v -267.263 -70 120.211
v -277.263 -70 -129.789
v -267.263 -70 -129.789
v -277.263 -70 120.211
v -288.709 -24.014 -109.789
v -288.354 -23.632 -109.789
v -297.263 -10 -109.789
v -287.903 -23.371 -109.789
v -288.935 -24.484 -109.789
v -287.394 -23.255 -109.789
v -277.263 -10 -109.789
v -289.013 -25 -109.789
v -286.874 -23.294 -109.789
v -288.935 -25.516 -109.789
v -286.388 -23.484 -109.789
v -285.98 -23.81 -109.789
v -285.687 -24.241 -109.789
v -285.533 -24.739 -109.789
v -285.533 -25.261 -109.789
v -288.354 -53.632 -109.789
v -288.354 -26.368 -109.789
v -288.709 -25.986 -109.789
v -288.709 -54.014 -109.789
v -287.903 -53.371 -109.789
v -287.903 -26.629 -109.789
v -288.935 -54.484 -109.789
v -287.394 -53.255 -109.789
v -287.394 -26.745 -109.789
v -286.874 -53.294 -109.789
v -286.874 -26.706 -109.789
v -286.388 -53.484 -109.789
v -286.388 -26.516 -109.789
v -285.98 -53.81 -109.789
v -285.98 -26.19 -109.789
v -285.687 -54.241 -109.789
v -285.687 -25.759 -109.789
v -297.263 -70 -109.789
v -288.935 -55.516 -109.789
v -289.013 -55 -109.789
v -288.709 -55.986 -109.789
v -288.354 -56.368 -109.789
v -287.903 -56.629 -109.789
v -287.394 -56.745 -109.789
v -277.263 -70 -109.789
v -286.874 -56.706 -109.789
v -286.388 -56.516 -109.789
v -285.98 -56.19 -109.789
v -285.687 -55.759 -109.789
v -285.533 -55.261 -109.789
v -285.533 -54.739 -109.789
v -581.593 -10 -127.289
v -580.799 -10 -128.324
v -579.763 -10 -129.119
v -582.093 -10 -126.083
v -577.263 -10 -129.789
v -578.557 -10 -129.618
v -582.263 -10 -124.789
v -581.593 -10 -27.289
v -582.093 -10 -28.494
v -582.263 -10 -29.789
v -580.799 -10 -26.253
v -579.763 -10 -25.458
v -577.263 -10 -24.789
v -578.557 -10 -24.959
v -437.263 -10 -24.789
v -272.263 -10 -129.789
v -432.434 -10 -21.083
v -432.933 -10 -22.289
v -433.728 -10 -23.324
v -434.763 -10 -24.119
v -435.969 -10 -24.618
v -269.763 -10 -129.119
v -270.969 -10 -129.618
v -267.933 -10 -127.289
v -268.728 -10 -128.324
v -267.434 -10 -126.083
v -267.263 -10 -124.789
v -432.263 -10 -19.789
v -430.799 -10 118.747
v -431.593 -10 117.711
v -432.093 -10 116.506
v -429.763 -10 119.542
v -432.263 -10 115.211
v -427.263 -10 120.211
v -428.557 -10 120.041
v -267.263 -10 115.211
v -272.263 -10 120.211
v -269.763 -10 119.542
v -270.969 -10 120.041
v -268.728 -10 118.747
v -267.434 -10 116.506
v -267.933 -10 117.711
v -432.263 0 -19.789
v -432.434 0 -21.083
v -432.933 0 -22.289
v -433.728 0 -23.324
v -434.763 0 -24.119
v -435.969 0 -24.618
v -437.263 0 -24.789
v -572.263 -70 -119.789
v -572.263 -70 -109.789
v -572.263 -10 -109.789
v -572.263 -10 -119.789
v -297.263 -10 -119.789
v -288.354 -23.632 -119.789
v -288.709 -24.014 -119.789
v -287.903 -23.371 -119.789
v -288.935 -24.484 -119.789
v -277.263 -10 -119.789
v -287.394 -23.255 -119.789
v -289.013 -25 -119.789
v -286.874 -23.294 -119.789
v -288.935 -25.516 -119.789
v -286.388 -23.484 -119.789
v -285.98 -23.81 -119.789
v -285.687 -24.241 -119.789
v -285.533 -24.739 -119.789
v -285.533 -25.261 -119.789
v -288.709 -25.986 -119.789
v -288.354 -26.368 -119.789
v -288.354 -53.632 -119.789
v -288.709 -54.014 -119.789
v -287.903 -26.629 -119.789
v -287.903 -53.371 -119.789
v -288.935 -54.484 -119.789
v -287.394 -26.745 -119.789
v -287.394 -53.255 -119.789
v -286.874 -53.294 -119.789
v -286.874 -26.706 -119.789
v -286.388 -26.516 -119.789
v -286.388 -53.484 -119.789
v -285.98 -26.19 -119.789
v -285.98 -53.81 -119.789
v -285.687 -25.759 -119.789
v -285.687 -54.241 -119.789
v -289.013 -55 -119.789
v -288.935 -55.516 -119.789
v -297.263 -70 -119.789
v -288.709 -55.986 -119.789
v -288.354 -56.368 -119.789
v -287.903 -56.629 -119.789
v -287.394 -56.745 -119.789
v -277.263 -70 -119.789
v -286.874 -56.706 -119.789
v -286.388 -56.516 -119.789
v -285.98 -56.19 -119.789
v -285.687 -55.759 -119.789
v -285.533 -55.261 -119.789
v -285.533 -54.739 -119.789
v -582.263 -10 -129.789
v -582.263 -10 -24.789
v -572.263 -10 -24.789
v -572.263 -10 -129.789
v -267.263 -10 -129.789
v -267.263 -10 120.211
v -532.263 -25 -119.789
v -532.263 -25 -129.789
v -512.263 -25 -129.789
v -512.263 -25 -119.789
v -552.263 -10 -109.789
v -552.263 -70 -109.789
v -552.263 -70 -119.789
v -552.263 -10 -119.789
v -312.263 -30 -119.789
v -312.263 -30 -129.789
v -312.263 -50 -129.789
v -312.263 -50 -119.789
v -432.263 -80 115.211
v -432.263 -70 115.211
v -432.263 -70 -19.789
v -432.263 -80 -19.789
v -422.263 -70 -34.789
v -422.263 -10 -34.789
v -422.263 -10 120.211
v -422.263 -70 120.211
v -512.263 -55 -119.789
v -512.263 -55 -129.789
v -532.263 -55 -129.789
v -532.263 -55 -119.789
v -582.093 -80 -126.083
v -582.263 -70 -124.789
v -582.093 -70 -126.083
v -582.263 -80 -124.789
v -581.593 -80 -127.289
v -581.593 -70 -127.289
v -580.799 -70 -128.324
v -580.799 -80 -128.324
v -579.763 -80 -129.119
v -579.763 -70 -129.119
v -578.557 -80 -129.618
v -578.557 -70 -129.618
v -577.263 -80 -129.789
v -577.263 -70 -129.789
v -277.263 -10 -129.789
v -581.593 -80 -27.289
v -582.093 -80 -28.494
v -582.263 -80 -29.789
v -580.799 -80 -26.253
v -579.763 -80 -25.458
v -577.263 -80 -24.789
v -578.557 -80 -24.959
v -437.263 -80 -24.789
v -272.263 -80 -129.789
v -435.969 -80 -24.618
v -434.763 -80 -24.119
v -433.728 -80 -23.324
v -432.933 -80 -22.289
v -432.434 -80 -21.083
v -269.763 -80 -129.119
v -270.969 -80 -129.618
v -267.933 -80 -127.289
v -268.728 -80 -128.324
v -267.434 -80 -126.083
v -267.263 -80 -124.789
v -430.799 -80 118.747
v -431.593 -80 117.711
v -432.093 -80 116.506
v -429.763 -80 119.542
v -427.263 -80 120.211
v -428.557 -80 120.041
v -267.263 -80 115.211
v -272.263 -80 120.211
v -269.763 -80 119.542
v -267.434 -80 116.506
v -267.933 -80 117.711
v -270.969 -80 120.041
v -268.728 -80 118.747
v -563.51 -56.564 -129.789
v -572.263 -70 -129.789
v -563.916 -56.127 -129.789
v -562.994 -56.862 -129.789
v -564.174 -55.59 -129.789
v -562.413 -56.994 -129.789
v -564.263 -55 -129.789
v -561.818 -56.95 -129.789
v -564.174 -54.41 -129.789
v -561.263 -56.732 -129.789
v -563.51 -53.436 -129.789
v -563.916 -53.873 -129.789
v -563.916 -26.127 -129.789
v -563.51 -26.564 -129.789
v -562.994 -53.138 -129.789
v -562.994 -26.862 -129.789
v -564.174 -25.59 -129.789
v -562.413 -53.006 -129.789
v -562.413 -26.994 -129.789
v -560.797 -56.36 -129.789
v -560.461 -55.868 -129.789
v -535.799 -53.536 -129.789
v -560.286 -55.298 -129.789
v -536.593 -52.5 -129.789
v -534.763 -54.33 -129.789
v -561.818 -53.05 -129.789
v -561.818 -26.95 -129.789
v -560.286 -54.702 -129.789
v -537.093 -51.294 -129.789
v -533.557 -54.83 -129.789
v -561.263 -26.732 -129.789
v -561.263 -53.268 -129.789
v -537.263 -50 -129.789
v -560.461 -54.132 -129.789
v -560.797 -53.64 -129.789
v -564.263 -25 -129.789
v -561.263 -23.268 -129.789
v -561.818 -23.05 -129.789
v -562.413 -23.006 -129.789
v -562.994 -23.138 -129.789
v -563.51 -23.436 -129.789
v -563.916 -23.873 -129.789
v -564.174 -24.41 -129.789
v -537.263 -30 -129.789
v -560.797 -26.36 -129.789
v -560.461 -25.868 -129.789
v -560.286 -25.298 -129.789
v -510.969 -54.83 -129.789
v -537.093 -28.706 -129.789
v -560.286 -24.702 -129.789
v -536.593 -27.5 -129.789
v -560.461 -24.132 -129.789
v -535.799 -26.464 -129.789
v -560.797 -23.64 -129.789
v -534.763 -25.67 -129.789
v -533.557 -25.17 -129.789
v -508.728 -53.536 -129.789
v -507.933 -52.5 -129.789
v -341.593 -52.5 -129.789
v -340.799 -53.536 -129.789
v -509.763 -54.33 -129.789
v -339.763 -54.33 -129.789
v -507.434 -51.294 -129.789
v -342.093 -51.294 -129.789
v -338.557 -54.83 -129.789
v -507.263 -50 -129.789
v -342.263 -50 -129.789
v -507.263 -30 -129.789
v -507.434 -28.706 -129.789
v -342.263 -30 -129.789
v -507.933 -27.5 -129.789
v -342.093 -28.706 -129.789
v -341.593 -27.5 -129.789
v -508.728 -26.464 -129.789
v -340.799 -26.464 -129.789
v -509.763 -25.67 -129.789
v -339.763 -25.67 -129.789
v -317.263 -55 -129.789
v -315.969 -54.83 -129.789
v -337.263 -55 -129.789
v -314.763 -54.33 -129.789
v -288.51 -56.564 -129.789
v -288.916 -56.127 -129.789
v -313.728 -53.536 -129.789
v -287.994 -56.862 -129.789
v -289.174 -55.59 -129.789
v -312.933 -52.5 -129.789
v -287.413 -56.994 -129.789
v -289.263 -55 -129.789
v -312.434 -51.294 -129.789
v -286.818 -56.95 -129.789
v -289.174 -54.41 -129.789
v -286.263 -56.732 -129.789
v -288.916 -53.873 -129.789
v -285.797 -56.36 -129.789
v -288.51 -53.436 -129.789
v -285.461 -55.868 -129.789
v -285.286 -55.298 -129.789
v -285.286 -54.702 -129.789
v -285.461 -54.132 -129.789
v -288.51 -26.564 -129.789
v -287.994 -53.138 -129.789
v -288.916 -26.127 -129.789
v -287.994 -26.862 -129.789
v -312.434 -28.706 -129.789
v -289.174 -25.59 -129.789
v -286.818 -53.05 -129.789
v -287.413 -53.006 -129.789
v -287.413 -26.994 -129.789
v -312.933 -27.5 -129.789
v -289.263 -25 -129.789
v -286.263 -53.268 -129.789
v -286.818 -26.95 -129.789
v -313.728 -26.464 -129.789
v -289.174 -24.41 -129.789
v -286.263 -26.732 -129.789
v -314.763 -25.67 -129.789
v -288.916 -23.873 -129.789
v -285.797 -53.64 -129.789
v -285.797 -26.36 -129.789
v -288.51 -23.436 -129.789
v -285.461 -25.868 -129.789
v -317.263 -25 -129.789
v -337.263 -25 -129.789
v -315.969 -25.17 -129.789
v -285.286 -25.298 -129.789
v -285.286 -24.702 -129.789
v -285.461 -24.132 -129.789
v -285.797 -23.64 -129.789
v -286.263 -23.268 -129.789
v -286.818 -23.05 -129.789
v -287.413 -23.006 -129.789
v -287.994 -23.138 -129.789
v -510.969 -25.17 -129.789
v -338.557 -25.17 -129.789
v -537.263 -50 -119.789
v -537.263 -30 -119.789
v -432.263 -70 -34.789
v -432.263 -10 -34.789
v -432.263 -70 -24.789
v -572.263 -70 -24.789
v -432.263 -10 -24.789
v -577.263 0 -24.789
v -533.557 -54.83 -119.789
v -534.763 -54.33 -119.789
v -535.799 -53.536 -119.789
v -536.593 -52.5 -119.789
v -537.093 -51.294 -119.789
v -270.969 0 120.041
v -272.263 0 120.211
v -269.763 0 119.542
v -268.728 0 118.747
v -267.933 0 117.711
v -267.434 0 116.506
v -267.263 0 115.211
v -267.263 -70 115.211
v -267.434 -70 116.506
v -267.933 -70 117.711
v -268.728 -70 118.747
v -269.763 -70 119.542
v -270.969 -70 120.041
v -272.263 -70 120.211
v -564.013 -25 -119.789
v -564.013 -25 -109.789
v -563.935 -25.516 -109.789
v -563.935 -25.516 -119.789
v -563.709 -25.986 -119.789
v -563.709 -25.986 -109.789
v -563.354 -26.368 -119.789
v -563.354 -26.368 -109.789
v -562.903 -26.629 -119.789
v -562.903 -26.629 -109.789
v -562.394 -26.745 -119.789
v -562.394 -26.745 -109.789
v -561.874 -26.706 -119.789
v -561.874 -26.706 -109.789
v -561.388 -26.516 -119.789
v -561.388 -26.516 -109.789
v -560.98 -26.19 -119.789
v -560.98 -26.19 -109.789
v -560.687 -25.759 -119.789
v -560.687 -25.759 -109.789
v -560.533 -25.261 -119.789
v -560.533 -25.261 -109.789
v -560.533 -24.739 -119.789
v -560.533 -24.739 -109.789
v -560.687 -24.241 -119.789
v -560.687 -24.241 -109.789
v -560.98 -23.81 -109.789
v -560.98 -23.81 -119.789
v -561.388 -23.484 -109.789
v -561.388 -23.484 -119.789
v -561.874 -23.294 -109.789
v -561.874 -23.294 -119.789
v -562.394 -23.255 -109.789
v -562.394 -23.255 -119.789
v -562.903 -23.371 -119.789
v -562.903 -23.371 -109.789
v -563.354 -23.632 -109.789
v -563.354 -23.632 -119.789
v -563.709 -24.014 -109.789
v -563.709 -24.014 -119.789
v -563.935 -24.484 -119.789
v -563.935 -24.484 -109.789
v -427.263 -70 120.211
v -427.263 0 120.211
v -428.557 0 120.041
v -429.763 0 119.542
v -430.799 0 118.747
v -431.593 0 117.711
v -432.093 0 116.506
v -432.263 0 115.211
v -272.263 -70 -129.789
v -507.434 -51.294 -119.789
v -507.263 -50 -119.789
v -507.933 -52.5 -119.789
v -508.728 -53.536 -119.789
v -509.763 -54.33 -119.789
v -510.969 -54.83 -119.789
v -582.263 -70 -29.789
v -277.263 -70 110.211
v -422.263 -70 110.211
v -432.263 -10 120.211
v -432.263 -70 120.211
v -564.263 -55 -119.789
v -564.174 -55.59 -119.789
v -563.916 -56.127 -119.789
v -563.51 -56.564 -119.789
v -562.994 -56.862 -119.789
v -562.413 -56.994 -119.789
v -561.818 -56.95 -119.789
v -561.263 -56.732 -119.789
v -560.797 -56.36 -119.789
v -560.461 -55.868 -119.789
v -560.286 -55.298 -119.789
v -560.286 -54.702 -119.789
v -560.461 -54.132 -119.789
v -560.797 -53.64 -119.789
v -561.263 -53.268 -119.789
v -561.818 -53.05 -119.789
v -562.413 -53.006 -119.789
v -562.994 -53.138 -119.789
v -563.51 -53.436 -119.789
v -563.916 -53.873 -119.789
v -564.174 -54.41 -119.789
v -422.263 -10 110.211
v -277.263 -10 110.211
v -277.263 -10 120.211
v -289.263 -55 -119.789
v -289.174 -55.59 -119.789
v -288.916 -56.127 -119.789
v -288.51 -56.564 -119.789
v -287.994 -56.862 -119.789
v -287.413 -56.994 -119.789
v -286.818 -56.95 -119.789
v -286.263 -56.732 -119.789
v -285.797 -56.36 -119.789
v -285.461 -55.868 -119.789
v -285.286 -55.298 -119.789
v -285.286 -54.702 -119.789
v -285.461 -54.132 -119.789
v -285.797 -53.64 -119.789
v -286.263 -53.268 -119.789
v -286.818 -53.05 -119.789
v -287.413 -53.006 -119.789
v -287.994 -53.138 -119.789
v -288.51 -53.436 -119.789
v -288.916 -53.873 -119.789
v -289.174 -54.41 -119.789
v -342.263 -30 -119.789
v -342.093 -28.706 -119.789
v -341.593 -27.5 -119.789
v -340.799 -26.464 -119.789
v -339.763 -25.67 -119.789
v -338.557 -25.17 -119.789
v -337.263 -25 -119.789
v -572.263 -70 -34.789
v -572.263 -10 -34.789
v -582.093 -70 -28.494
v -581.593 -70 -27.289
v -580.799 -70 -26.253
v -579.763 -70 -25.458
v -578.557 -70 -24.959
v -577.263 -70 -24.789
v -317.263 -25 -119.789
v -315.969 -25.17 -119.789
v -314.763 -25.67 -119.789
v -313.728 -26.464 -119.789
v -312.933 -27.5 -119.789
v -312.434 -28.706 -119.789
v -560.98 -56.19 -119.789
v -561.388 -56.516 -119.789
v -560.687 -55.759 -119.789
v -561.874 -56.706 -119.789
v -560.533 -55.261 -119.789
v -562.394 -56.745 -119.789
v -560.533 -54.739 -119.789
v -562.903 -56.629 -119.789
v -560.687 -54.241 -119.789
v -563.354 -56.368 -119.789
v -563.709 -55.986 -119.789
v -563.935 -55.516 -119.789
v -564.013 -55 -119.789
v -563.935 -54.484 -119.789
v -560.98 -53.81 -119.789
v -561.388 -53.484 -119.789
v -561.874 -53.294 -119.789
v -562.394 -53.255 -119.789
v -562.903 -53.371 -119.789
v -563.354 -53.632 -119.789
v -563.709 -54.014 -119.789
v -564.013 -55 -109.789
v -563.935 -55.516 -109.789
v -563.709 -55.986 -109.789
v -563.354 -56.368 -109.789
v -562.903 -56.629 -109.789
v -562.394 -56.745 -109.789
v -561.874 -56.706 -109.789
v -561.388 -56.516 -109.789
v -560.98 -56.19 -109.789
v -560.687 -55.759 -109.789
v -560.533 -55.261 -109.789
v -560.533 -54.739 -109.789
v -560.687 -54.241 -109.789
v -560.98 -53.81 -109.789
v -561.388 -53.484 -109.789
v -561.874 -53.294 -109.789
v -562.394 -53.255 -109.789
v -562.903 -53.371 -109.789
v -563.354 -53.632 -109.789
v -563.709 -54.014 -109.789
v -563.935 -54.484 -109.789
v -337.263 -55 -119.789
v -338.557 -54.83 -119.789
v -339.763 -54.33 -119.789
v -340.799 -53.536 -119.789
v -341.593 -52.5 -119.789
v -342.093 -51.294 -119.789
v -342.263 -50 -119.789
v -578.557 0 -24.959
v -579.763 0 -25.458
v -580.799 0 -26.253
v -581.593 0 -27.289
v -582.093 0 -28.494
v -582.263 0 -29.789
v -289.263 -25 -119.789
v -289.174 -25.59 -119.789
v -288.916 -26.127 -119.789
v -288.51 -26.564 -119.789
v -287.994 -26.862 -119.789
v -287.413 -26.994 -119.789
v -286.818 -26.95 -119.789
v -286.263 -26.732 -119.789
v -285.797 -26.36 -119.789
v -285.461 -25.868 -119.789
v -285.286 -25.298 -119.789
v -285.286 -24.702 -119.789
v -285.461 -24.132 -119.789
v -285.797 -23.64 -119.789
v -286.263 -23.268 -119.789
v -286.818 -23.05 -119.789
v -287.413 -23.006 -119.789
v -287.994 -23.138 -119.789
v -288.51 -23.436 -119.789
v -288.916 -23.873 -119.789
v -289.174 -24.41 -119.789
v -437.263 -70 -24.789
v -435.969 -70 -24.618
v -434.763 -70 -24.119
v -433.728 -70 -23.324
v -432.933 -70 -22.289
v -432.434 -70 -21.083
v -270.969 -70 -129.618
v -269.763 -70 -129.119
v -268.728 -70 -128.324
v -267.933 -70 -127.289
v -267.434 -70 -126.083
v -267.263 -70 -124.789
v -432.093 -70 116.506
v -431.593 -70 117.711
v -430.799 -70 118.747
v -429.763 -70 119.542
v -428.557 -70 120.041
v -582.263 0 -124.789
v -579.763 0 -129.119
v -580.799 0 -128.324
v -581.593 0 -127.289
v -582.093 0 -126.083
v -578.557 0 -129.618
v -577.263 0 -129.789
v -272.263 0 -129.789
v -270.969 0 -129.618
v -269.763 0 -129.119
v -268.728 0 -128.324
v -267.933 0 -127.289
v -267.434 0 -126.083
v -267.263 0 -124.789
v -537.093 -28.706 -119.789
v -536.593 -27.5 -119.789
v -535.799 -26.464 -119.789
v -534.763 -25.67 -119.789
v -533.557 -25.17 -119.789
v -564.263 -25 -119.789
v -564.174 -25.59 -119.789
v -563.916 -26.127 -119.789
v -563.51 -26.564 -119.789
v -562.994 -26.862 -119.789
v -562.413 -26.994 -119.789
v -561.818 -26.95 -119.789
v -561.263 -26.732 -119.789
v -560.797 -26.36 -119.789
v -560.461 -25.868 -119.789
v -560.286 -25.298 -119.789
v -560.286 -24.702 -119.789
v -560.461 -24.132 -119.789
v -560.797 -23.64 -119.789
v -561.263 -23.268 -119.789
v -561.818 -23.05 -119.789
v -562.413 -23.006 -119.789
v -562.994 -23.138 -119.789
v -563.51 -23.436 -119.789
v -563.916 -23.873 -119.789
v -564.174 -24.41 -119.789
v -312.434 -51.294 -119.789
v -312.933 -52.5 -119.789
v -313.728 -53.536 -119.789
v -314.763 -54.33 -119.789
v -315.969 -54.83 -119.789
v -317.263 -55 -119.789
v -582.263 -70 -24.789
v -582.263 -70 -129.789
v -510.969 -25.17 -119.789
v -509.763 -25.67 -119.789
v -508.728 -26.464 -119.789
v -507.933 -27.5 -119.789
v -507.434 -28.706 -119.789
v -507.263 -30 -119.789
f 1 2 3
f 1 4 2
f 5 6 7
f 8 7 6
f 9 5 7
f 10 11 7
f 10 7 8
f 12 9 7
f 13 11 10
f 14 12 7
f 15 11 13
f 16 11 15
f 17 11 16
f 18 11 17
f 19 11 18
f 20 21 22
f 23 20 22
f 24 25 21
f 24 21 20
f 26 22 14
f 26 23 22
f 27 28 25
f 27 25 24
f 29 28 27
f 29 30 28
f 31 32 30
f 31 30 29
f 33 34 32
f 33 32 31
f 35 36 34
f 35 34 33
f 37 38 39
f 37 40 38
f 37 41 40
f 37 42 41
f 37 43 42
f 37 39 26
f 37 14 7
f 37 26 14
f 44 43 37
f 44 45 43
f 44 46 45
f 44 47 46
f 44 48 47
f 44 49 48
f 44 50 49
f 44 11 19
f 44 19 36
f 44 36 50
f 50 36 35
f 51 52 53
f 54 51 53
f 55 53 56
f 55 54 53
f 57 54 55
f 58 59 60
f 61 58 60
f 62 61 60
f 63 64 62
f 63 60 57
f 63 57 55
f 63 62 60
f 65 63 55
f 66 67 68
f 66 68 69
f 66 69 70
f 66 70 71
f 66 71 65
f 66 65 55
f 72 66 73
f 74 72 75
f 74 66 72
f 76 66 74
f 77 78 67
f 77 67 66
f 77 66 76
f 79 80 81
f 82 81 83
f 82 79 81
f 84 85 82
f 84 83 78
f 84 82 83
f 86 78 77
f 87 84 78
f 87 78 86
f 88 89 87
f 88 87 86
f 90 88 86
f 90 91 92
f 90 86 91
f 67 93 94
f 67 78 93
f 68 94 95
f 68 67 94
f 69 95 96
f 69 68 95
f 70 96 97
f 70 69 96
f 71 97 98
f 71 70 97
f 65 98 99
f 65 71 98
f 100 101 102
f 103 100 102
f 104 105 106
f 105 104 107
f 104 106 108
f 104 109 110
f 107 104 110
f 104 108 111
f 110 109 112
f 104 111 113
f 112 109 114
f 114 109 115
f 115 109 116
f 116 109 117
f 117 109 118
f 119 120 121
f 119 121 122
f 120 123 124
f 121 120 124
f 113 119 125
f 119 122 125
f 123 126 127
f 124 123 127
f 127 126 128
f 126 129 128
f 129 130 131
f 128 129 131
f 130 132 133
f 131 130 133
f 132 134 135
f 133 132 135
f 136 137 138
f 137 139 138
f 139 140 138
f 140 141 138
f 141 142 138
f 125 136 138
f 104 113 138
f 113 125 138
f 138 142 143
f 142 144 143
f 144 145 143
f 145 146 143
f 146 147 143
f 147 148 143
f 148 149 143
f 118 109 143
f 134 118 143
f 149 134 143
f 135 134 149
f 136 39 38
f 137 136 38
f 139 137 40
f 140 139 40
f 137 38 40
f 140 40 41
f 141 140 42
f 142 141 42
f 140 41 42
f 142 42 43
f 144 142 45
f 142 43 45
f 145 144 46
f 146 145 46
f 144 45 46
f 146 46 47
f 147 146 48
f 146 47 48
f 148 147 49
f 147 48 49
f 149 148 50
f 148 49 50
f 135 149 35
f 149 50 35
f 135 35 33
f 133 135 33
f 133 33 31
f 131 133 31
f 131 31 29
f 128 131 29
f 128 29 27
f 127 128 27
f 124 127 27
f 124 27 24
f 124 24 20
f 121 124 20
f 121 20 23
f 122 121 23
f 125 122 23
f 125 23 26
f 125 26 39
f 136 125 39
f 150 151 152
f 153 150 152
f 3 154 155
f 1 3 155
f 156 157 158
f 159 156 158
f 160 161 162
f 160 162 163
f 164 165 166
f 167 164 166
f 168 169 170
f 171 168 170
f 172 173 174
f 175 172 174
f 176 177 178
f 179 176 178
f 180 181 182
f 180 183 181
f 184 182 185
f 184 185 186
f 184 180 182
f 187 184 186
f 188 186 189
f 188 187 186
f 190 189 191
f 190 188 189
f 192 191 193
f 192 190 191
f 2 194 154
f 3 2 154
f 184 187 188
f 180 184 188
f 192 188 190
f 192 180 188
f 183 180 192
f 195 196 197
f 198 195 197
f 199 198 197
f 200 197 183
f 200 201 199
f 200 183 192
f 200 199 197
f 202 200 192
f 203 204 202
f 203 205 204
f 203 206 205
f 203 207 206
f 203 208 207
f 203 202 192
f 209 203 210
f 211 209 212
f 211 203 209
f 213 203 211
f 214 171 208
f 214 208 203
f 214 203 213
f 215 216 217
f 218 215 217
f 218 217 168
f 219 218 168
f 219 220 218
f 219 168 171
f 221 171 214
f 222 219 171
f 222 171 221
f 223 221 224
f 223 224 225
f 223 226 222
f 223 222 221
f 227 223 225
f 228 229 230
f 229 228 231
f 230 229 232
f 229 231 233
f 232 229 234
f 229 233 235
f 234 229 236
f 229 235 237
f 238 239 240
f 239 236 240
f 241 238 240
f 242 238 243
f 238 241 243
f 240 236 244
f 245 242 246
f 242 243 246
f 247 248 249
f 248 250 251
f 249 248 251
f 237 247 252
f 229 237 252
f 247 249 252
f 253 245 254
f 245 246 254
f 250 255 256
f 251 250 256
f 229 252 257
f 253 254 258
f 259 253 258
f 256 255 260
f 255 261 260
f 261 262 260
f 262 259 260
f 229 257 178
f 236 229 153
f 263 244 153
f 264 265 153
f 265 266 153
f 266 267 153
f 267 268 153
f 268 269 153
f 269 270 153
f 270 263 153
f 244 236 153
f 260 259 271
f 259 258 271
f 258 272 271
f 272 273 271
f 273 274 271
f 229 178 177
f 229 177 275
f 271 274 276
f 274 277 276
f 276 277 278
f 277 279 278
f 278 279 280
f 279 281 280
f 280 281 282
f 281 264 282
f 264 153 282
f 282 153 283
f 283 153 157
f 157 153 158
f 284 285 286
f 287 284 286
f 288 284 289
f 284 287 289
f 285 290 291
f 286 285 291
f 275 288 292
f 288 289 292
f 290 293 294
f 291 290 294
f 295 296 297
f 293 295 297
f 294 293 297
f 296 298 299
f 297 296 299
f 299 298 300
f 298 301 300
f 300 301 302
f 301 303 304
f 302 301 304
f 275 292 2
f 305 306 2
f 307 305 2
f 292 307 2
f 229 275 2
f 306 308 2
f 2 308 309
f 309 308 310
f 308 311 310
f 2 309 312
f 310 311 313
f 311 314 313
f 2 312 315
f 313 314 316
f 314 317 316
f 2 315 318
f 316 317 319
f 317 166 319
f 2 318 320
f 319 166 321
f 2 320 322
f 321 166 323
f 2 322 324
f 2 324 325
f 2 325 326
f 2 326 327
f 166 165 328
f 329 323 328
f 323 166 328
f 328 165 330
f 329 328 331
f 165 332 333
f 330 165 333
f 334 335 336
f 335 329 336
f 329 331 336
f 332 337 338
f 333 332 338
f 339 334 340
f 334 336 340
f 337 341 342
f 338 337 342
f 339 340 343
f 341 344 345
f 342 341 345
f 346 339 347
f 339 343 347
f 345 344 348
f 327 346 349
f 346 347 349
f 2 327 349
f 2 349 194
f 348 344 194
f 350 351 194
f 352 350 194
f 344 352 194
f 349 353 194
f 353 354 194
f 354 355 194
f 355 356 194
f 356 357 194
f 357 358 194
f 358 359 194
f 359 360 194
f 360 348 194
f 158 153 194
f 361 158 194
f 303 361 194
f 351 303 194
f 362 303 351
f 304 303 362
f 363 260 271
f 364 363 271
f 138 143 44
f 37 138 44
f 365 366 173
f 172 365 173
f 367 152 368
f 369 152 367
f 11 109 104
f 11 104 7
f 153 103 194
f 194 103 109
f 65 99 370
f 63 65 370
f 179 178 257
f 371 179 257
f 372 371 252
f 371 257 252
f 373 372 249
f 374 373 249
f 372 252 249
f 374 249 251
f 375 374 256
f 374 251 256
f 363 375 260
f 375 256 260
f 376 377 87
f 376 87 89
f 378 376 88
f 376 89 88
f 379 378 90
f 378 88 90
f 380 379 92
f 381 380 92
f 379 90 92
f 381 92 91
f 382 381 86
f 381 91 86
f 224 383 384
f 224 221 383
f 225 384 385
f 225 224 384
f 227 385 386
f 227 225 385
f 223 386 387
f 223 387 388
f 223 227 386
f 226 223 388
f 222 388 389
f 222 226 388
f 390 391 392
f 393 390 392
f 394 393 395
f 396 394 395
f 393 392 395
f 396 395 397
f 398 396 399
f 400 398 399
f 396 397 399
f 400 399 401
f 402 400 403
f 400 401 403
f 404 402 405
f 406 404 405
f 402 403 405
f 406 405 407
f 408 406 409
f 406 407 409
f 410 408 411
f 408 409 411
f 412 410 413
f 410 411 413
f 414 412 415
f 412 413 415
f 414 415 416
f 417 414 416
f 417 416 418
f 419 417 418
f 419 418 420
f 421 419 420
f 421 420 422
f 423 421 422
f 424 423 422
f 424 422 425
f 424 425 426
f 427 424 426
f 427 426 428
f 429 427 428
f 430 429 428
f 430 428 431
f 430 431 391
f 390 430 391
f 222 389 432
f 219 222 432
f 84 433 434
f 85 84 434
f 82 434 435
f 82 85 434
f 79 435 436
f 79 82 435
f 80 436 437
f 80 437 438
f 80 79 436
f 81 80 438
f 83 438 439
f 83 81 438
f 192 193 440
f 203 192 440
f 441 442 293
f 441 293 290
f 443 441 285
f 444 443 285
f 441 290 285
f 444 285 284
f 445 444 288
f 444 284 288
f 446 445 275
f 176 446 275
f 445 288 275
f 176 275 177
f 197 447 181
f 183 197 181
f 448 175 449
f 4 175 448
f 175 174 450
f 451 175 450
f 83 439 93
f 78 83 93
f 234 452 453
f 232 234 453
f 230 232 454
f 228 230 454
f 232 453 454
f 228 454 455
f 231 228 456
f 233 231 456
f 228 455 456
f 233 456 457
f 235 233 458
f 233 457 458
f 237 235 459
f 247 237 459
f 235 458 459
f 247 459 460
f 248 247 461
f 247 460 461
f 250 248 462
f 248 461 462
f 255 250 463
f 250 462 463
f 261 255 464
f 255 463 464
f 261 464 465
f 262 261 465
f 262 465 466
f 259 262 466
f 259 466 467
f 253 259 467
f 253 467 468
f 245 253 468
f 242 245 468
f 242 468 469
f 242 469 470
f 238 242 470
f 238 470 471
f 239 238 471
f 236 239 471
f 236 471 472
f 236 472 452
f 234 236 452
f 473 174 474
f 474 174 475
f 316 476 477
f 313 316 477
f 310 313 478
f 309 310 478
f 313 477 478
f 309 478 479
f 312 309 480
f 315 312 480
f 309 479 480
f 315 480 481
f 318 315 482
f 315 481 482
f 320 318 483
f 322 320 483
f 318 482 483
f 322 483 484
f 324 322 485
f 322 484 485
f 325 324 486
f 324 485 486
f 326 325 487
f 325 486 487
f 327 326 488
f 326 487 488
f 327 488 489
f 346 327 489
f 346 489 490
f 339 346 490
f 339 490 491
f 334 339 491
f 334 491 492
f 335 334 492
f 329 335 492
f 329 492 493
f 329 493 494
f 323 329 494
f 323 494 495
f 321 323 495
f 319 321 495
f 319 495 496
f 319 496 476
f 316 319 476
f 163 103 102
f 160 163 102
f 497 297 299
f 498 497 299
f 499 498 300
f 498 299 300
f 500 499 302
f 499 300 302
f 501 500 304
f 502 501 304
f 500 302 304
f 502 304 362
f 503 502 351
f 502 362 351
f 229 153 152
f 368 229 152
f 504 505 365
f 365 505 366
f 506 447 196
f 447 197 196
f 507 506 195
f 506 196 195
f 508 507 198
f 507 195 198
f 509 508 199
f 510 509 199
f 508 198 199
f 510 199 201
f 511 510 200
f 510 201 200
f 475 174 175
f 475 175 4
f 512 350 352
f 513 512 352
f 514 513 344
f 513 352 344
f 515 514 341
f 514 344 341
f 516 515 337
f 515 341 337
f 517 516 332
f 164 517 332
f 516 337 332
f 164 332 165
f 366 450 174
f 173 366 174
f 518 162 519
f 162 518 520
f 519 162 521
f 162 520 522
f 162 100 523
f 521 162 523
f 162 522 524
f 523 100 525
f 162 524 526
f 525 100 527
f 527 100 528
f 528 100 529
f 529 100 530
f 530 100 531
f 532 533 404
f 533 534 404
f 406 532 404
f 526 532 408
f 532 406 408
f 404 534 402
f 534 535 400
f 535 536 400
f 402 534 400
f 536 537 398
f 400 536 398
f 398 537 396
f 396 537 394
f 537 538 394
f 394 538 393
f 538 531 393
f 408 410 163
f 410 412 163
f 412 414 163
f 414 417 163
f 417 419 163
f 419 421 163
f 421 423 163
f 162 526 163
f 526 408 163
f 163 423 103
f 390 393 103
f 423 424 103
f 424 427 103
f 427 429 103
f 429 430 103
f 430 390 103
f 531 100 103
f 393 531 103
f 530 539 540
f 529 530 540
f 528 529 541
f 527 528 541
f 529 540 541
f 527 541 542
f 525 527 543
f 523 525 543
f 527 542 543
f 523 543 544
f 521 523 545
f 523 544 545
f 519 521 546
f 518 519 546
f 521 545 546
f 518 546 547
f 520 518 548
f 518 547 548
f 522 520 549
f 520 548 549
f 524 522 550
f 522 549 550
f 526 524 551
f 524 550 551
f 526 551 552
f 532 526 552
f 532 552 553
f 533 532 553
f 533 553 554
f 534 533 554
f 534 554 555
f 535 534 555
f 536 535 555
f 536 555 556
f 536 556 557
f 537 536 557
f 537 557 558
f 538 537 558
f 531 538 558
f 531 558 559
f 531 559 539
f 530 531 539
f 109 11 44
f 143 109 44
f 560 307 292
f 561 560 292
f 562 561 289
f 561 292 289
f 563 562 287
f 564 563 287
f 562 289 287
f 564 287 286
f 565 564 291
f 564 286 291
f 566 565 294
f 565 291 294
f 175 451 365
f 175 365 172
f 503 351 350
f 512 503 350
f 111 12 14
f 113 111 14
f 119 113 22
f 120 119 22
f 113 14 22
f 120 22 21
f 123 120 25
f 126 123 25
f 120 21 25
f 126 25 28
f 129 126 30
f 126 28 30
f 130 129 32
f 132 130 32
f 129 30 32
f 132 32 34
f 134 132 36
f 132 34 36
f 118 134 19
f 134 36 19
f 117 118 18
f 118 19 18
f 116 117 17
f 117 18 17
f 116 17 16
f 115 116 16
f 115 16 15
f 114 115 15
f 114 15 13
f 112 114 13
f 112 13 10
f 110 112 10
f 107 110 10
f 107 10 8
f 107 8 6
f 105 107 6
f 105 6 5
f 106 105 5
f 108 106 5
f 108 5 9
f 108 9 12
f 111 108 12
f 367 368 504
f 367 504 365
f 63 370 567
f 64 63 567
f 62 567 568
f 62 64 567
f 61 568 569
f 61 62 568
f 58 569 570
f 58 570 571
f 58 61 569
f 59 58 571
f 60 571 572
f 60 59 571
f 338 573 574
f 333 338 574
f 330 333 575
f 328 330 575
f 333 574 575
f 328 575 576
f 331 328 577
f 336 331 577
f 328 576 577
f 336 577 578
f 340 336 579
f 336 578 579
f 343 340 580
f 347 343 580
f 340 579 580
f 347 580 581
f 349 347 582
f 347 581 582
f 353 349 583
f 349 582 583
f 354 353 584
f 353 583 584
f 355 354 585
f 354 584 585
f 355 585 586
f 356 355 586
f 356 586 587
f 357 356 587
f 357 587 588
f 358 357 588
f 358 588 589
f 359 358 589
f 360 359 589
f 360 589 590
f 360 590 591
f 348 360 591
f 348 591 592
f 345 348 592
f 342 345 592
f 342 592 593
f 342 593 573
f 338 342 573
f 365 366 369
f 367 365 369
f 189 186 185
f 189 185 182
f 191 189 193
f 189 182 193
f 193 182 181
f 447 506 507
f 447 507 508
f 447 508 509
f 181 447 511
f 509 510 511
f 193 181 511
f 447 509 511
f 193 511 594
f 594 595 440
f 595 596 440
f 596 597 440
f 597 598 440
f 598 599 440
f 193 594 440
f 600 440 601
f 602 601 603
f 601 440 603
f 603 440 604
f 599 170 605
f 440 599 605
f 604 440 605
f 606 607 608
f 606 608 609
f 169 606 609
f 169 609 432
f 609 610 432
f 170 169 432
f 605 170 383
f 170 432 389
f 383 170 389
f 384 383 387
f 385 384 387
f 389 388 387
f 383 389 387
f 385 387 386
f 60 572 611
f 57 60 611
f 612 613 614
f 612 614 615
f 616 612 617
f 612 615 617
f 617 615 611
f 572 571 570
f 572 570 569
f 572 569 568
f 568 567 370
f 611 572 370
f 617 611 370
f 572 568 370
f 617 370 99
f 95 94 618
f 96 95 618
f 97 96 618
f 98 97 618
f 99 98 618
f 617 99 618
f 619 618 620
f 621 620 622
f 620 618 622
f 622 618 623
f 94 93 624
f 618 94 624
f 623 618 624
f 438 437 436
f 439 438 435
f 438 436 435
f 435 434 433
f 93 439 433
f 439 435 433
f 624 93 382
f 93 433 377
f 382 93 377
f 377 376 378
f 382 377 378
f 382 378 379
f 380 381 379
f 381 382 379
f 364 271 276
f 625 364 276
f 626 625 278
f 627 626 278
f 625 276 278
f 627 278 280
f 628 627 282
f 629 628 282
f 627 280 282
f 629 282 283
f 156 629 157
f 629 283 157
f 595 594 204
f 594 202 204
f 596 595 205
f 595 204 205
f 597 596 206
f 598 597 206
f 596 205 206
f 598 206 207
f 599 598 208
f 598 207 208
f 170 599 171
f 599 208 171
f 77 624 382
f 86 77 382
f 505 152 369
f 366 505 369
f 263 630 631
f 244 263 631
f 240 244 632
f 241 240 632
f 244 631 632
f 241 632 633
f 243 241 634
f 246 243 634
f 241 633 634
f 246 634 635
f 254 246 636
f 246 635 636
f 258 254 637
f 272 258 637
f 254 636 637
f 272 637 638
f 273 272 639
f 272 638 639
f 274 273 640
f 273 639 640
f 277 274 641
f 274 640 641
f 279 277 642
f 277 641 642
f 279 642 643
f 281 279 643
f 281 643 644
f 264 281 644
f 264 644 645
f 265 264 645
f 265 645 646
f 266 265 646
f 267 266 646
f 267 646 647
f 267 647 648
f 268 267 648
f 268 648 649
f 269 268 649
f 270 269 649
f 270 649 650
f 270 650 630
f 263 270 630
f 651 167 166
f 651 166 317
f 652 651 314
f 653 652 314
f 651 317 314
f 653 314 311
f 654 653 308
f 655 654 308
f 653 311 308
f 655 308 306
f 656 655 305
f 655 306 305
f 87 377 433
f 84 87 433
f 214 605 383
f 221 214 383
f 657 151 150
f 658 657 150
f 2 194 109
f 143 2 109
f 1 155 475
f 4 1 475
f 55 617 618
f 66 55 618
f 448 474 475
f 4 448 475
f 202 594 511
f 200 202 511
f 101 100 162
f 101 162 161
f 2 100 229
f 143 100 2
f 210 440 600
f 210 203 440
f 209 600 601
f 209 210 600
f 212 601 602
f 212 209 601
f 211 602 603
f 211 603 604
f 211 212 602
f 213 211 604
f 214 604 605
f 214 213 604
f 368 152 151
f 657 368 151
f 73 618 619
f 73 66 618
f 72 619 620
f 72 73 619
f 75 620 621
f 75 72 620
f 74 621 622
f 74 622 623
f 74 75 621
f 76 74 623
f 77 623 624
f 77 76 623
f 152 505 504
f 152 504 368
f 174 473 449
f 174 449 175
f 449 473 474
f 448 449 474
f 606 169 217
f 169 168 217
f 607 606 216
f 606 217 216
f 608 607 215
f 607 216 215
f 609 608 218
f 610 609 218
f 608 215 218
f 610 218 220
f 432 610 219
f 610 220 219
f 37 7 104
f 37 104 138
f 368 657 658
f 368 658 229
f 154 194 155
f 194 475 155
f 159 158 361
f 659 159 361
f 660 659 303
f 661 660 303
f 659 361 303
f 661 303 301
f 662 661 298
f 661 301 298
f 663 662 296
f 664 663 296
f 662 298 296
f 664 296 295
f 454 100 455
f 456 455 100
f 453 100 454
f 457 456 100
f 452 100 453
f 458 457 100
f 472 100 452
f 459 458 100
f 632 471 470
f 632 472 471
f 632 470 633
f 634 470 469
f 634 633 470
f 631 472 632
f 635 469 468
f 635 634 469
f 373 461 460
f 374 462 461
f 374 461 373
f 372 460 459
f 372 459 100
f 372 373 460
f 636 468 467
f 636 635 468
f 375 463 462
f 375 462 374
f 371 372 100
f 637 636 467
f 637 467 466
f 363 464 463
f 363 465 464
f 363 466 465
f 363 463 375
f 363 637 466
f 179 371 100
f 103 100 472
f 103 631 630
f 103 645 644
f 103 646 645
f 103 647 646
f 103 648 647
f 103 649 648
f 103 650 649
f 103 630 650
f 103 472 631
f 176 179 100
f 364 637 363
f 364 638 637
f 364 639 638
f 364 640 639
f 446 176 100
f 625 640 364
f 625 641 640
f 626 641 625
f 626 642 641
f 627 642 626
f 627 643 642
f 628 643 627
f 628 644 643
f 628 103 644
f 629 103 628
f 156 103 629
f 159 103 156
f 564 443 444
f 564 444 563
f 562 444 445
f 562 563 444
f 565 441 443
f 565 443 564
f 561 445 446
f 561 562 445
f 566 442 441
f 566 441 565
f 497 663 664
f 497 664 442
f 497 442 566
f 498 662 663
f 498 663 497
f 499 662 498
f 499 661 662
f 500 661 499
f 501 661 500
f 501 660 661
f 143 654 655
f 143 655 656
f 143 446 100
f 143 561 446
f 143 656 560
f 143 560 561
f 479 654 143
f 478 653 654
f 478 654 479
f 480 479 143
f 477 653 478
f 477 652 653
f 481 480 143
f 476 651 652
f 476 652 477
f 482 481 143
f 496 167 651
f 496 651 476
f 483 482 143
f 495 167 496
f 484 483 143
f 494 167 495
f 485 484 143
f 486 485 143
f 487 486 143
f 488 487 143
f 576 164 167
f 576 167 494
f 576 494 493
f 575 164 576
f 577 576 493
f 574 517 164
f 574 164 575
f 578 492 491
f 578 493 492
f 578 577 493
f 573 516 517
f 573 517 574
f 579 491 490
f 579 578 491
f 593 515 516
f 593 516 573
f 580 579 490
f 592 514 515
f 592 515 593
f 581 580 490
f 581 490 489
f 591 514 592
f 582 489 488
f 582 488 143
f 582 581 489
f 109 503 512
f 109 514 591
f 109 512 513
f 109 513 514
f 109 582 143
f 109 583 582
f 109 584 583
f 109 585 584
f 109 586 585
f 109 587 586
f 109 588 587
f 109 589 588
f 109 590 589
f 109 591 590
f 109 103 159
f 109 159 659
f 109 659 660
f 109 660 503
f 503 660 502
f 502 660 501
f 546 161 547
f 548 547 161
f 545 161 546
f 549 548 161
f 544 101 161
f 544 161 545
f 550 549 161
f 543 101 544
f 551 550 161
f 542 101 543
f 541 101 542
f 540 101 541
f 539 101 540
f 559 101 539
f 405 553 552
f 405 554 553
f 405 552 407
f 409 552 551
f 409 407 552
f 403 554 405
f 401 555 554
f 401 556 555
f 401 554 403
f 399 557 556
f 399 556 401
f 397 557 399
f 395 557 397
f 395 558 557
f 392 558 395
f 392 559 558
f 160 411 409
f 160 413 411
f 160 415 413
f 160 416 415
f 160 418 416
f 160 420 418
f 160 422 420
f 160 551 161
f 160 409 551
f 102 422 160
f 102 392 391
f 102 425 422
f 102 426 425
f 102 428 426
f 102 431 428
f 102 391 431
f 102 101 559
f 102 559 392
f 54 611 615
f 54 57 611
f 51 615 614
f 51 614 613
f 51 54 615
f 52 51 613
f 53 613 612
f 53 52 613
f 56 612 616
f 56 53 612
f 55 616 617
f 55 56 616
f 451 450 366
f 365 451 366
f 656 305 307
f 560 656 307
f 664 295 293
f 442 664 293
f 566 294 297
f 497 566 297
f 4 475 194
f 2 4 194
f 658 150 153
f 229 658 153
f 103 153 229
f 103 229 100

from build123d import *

# Parameters (mm, degrees)
F1_DEPTH     = 10
F3_DEPTH     = 60
F2_W         = 140
F2_H         = 10
F4_DEPTH     = 60
F5_DEPTH     = 60
F2_W_2       = 145
F6_DEPTH     = 60
F7_DEPTH     = 60
F2_W_3       = 295
F8_DEPTH     = 60
F10_DEPTH    = 13
F12_DEPTH    = 10
F13_R        = 5
F14_R        = 5
F14_2_R      = 5
F15_W        = 60
F15_H        = 10
F16_DEPTH    = 20
F17_W        = 60
F17_H        = 10
F18_DEPTH    = 20
F20_D        = 4
F23_D        = 3.5
F23_ON_F22_D = 3.5


with BuildPart() as f1:
    # F0 (on Front) → F1 (new body)
    with BuildSketch(Plane.XZ):
        Polygon((-267.2632135372, 120.211422946), (-432.2632135372, 120.211422946), (-432.2632135372, -24.788577054), (-582.2632135372, -24.788577054), (-582.2632135372, -129.788577054), (-267.2632135372, -129.788577054), align=None)
    extrude(amount=F1_DEPTH)

    # F14
    f14_edges = [f1.edges().sort_by_distance(p)[0] for p in [
        (-582.263214, -5, -129.788577),
        (-582.263214, -5, -24.788577),
        (-432.263214, -5, -24.788577),
        (-432.263214, -5, 120.211423),
        (-267.263214, -5, 120.211423),
        (-267.263214, -5, -129.788577),
    ]]
    fillet(f14_edges, radius=F14_R)


with BuildPart() as f3:
    # F2 (on face) → F3 (new body)
    with BuildSketch(Plane.XZ.offset(10)):
        Polygon((-572.2632135372, -24.788577054), (-582.2632135372, -24.788577054), (-582.2632135372, -129.788577054), (-572.2632135372, -129.788577054), (-572.2632135372, -119.788577054), (-572.2632135372, -34.788577054), align=None)
    extrude(amount=F3_DEPTH)


with BuildPart() as f4:
    # F2 (on face) → F4 (new body)
    with BuildSketch(Plane.XZ.offset(10)):
        with Locations((-502.2632135372, -29.788577054)):
            Rectangle(F2_W, F2_H)
    extrude(amount=F4_DEPTH)


with BuildPart() as f5:
    # F2 (on face) → F5 (new body)
    with BuildSketch(Plane.XZ.offset(10)):
        Polygon((-432.2632135372, 120.211422946), (-432.2632135372, -24.788577054), (-432.2632135372, -34.788577054), (-422.2632135372, -34.788577054), (-422.2632135372, 110.211422946), (-422.2632135372, 120.211422946), align=None)
    extrude(amount=F5_DEPTH)


with BuildPart() as f6:
    # F2 (on face) → F6 (new body)
    with BuildSketch(Plane.XZ.offset(10)):
        with Locations((-349.7632135372, 115.211422946)):
            Rectangle(F2_W_2, F2_H)
    extrude(amount=F6_DEPTH)


with BuildPart() as f7:
    # F2 (on face) → F7 (new body)
    with BuildSketch(Plane.XZ.offset(10)):
        Polygon((-277.2632135372, -119.788577054), (-277.2632135372, -129.788577054), (-267.2632135372, -129.788577054), (-267.2632135372, 120.211422946), (-277.2632135372, 120.211422946), (-277.2632135372, 110.211422946), align=None)
    extrude(amount=F7_DEPTH)


with BuildPart() as f8:
    # F2 (on face) → F8 (new body)
    with BuildSketch(Plane.XZ.offset(10)):
        with Locations((-424.7632135372, -124.788577054)):
            Rectangle(F2_W_3, F2_H)
    extrude(amount=F8_DEPTH)

    # F9 (on face) → F10 (cut)
    with BuildSketch(Plane(origin=(0, 0, -129.788577054), x_dir=(1, 0, 0), z_dir=(0, 0, -1))):
        with BuildLine():
            Line((-512.2632135372, 55), (-532.2632135372, 55))
            ThreePointArc((-532.2632135372, 55), (-535.7987474431, 53.5355339059), (-537.2632135372, 50))
            Line((-537.2632135372, 50), (-537.2632135372, 30))
            ThreePointArc((-537.2632135372, 30), (-535.7987474431, 26.4644660941), (-532.2632135372, 25))
            Line((-532.2632135372, 25), (-512.2632135372, 25))
            ThreePointArc((-512.2632135372, 25), (-508.7276796312, 26.4644660941), (-507.2632135372, 30))
            Line((-507.2632135372, 30), (-507.2632135372, 50))
            ThreePointArc((-507.2632135372, 50), (-508.7276796312, 53.5355339059), (-512.2632135372, 55))
        make_face()
        with BuildLine():
            Line((-317.2632135372, 55), (-337.2632135372, 55))
            ThreePointArc((-337.2632135372, 55), (-340.7987474431, 53.5355339059), (-342.2632135372, 50))
            Line((-342.2632135372, 50), (-342.2632135372, 30))
            ThreePointArc((-342.2632135372, 30), (-340.7987474431, 26.4644660941), (-337.2632135372, 25))
            Line((-337.2632135372, 25), (-317.2632135372, 25))
            ThreePointArc((-317.2632135372, 25), (-313.7276796312, 26.4644660941), (-312.2632135372, 30))
            Line((-312.2632135372, 30), (-312.2632135372, 50))
            ThreePointArc((-312.2632135372, 50), (-313.7276796312, 53.5355339059), (-317.2632135372, 55))
        make_face()
    extrude(amount=-F10_DEPTH, mode=Mode.SUBTRACT)

    # F20 (through all)
    with Locations(Plane(origin=(0, 0, -129.788577054), x_dir=(1, 0, 0), z_dir=(0, 0, -1))):
        with Locations((-562.2632135372, 55), (-562.2632135372, 25), (-287.2632135372, 55), (-287.2632135372, 25)):
            Hole(F20_D / 2)


with BuildPart() as f12:
    # F11 (on face) → F12 (new body)
    with BuildSketch(Plane.XZ.offset(70)):
        Polygon((-267.2632135372, 120.211422946), (-432.2632135372, 120.211422946), (-432.2632135372, -24.788577054), (-582.2632135372, -24.788577054), (-582.2632135372, -129.788577054), (-267.2632135372, -129.788577054), align=None)
    extrude(amount=F12_DEPTH)

    # F13
    f13_edges = [f12.edges().sort_by_distance(p)[0] for p in [
        (-582.263214, -75, -129.788577),
    ]]
    fillet(f13_edges, radius=F13_R)

    # F14#2
    f14_2_edges = [f12.edges().sort_by_distance(p)[0] for p in [
        (-582.263214, -75, -24.788577),
        (-432.263214, -75, -24.788577),
        (-432.263214, -75, 120.211423),
        (-267.263214, -75, 120.211423),
        (-267.263214, -75, -129.788577),
    ]]
    fillet(f14_2_edges, radius=F14_2_R)


with BuildPart() as f16:
    # F15 (on face) → F16 (new body)
    with BuildSketch(Plane.YZ.offset(-572.2632135372)):
        with Locations((-40, -114.788577054)):
            Rectangle(F15_W, F15_H)
    extrude(amount=F16_DEPTH)

    # F23 (through all)
    with Locations(Plane(origin=(0, 0, -119.788577054), x_dir=(1, 0, 0), z_dir=(0, 0, -1))):
        with Locations((-562.2632135372, 55), (-562.2632135372, 25)):
            Hole(F23_D / 2)


with BuildPart() as f18:
    # F17 (on face) → F18 (new body)
    with BuildSketch(Plane(origin=(-277.2632135372, 0, 0), x_dir=(0, -1, 0), z_dir=(-1, 0, 0))):
        with Locations((40, -114.788577054)):
            Rectangle(F17_W, F17_H)
    extrude(amount=F18_DEPTH)

    # F23 on F22 (through all)
    with Locations(Plane(origin=(0, 0, -119.788577054), x_dir=(1, 0, 0), z_dir=(0, 0, -1))):
        with Locations((-287.2632135372, 55), (-287.2632135372, 25)):
            Hole(F23_ON_F22_D / 2)


solid = Compound([f1.part, f3.part, f4.part, f5.part, f6.part, f7.part, f8.part, f12.part, f16.part, f18.part])
